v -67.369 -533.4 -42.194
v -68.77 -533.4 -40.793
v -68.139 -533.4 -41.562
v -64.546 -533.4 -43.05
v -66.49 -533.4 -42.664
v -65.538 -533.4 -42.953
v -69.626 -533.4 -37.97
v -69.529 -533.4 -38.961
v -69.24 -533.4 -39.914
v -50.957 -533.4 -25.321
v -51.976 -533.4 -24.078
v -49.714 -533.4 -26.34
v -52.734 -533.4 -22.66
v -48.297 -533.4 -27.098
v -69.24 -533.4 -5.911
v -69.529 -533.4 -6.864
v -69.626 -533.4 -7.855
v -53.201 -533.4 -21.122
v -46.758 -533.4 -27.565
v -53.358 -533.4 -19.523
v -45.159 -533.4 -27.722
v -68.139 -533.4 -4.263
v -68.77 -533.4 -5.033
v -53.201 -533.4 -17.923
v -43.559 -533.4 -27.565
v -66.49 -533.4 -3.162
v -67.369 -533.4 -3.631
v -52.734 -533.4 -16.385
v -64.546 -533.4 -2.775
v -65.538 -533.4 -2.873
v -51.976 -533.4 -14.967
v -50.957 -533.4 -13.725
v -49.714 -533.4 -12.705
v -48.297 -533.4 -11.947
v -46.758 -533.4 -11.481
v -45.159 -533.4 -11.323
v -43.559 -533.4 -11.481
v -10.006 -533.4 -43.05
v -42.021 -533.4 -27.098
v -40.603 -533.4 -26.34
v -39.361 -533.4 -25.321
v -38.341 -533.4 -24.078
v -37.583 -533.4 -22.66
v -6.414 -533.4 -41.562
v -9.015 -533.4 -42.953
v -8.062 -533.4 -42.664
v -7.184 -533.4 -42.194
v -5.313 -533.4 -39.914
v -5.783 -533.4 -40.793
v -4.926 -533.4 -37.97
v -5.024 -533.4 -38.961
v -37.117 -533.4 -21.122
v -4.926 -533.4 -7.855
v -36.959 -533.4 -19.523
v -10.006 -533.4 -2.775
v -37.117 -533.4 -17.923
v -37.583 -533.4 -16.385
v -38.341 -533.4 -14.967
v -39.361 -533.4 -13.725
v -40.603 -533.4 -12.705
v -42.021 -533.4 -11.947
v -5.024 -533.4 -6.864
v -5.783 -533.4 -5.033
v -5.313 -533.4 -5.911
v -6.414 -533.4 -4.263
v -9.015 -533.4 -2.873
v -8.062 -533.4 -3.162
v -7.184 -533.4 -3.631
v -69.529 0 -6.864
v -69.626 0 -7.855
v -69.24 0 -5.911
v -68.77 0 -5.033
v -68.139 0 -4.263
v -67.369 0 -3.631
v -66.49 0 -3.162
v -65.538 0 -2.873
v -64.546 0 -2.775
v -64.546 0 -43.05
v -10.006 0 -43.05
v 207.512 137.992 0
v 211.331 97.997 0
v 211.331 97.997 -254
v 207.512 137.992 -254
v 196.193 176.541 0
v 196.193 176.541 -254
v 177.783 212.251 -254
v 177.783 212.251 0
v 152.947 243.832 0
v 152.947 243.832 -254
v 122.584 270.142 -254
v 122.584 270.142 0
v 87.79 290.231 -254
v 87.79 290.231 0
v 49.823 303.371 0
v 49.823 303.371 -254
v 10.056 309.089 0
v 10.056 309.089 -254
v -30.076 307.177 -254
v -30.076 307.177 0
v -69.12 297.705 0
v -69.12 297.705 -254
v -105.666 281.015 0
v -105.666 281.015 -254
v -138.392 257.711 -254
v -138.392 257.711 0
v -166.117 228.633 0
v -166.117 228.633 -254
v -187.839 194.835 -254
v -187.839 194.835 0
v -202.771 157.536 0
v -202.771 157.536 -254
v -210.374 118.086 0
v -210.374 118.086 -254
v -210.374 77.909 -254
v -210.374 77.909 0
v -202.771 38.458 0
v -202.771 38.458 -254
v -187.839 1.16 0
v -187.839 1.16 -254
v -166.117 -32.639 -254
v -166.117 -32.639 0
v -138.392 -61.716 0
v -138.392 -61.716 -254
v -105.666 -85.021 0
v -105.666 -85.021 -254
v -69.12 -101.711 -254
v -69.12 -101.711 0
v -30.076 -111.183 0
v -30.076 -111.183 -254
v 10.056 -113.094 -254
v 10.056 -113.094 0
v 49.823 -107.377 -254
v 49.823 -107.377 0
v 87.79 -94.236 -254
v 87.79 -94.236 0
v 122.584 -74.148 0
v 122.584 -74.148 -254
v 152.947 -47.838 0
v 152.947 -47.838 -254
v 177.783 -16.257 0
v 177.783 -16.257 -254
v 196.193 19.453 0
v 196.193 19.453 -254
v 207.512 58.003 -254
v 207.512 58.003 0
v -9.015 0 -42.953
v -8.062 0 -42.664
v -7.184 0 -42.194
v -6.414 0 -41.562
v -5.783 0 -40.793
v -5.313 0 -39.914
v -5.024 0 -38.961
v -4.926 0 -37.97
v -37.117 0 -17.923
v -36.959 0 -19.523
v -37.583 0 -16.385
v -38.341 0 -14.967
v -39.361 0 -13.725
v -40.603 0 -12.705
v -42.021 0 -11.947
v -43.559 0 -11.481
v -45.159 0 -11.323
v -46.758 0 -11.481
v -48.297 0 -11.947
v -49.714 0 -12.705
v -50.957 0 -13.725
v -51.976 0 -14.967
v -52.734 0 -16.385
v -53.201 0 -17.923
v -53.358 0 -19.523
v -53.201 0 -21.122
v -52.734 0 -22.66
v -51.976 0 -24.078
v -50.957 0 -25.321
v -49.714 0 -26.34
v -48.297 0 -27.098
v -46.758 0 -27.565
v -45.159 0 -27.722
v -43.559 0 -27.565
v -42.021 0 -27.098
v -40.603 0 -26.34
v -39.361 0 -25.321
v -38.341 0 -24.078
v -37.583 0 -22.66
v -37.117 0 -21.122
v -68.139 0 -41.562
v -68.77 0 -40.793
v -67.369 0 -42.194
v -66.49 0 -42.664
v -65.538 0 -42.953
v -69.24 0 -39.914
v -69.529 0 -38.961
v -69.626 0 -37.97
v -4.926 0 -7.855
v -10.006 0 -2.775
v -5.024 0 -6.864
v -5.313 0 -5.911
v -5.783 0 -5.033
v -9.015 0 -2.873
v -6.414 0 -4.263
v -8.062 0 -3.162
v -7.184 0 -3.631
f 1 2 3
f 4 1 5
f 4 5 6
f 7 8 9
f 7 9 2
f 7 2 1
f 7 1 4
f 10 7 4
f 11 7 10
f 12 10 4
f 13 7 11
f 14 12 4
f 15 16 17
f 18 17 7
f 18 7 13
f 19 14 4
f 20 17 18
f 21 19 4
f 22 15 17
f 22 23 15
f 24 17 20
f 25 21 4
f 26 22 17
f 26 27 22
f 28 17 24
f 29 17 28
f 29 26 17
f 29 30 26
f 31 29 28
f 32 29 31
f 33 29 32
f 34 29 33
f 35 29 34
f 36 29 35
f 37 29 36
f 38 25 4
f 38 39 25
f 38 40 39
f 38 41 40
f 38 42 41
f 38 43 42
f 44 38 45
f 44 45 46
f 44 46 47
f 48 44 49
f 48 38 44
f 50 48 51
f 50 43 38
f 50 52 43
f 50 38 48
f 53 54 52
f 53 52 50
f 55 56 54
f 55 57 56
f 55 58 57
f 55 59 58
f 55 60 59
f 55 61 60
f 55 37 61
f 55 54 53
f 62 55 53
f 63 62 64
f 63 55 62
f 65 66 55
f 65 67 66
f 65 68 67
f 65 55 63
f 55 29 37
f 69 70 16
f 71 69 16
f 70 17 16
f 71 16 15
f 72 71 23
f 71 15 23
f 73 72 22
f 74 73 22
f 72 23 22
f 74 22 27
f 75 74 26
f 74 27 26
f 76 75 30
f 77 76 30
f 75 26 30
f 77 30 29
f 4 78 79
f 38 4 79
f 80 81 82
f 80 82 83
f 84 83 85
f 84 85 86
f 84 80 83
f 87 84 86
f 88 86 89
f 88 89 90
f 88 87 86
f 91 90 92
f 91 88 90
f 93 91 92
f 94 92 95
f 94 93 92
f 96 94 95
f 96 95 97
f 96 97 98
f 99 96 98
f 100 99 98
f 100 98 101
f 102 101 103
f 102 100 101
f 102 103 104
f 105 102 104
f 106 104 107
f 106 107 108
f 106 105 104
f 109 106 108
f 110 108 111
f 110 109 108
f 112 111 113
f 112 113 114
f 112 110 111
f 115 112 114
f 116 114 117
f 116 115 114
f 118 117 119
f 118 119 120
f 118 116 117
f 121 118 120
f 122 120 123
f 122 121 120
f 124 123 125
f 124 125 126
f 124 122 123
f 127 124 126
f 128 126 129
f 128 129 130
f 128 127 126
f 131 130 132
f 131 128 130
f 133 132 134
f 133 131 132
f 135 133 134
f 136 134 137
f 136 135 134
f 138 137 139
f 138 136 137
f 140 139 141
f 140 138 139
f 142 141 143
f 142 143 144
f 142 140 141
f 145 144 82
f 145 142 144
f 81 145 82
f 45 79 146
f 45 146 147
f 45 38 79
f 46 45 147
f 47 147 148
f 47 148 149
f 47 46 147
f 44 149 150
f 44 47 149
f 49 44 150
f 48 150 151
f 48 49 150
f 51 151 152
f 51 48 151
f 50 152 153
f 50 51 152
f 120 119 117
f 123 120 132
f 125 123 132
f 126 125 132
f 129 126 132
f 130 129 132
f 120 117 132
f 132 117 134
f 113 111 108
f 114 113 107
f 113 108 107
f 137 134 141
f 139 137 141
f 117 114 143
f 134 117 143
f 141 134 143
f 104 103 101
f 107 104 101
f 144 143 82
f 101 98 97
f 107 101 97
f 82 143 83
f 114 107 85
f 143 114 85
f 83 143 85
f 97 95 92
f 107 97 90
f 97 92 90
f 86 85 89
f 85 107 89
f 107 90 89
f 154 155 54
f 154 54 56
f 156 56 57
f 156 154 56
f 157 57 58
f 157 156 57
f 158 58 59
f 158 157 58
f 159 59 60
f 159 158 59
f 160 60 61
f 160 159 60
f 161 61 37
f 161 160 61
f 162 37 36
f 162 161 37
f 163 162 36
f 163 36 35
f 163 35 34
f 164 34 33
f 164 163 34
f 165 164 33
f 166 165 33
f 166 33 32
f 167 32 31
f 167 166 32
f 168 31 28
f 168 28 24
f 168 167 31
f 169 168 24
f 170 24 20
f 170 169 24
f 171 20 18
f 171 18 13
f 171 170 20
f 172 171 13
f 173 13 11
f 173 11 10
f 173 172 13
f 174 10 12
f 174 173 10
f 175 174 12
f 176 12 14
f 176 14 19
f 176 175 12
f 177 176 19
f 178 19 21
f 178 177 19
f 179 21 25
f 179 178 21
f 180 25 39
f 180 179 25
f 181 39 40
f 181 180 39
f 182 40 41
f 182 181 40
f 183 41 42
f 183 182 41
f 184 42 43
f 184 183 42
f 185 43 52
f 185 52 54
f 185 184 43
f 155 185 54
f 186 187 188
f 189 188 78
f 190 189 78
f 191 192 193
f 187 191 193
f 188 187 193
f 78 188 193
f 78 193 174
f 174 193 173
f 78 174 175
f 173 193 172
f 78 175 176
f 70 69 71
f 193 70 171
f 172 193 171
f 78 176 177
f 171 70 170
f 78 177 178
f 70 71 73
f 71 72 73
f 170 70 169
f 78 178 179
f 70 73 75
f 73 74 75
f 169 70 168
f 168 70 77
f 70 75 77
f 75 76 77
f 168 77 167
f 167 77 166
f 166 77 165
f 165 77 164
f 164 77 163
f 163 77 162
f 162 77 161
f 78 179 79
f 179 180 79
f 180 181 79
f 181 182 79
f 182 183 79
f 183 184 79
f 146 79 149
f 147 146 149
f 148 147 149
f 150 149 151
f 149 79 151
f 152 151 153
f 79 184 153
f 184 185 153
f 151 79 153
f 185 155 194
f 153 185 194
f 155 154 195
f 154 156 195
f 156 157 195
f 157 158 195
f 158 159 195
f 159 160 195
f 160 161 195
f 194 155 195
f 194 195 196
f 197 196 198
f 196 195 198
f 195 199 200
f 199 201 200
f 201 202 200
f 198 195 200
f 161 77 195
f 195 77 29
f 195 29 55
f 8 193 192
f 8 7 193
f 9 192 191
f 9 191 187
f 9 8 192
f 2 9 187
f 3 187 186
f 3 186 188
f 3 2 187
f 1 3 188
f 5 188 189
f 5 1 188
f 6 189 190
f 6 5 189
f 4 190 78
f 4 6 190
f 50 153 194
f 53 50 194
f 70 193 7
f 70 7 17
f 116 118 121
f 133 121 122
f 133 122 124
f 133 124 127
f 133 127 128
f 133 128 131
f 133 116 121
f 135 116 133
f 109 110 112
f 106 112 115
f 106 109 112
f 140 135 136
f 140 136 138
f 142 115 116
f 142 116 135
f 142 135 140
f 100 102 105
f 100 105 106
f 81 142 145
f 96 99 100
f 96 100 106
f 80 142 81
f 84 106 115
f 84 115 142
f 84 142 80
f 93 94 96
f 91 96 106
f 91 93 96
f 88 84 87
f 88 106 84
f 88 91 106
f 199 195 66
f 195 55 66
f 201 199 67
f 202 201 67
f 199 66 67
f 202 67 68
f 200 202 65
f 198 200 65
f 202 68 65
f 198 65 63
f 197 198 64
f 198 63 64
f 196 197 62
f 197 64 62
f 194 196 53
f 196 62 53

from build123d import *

# Parameters (mm, degrees)
F0_W     = 64.7000456229
F0_H     = 40.2752840891
F0_R     = 8.1996249531
F1_DEPTH = 533.4
F2_R     = 5.08
F3_R     = 211.3310828814
F4_DEPTH = 254


# Not quite as in the source:
# - a feature names something its author has since deleted; it is built from what else it names


with BuildPart() as f1:
    # F0 (on Front) → F1 (new body)
    with BuildSketch(Plane.XZ):
        with Locations((-37.2764277272, -22.9125614278)):
            Rectangle(F0_W, F0_H)
        with Locations((-45.1586656272, -19.5226017386)):
            Circle(F0_R, mode=Mode.SUBTRACT)
    extrude(amount=F1_DEPTH)

    # F2
    f2_edges = [f1.edges().sort_by_distance(p)[0] for p in [
        (-4.926405, -266.7, -2.774919),
        (-4.926405, -266.7, -43.050203),
        (-69.626451, -266.7, -2.774919),
        (-69.626451, -266.7, -43.050203),
    ]]
    fillet(f2_edges, radius=F2_R)


with BuildPart() as f4:
    # F3 (on Top) → F4 (new body)
    with BuildSketch(Plane.XY):
        with Locations((0, 97.9972705245)):
            Circle(F3_R)
    extrude(amount=-F4_DEPTH)


solid = Compound([f1.part, f4.part])
